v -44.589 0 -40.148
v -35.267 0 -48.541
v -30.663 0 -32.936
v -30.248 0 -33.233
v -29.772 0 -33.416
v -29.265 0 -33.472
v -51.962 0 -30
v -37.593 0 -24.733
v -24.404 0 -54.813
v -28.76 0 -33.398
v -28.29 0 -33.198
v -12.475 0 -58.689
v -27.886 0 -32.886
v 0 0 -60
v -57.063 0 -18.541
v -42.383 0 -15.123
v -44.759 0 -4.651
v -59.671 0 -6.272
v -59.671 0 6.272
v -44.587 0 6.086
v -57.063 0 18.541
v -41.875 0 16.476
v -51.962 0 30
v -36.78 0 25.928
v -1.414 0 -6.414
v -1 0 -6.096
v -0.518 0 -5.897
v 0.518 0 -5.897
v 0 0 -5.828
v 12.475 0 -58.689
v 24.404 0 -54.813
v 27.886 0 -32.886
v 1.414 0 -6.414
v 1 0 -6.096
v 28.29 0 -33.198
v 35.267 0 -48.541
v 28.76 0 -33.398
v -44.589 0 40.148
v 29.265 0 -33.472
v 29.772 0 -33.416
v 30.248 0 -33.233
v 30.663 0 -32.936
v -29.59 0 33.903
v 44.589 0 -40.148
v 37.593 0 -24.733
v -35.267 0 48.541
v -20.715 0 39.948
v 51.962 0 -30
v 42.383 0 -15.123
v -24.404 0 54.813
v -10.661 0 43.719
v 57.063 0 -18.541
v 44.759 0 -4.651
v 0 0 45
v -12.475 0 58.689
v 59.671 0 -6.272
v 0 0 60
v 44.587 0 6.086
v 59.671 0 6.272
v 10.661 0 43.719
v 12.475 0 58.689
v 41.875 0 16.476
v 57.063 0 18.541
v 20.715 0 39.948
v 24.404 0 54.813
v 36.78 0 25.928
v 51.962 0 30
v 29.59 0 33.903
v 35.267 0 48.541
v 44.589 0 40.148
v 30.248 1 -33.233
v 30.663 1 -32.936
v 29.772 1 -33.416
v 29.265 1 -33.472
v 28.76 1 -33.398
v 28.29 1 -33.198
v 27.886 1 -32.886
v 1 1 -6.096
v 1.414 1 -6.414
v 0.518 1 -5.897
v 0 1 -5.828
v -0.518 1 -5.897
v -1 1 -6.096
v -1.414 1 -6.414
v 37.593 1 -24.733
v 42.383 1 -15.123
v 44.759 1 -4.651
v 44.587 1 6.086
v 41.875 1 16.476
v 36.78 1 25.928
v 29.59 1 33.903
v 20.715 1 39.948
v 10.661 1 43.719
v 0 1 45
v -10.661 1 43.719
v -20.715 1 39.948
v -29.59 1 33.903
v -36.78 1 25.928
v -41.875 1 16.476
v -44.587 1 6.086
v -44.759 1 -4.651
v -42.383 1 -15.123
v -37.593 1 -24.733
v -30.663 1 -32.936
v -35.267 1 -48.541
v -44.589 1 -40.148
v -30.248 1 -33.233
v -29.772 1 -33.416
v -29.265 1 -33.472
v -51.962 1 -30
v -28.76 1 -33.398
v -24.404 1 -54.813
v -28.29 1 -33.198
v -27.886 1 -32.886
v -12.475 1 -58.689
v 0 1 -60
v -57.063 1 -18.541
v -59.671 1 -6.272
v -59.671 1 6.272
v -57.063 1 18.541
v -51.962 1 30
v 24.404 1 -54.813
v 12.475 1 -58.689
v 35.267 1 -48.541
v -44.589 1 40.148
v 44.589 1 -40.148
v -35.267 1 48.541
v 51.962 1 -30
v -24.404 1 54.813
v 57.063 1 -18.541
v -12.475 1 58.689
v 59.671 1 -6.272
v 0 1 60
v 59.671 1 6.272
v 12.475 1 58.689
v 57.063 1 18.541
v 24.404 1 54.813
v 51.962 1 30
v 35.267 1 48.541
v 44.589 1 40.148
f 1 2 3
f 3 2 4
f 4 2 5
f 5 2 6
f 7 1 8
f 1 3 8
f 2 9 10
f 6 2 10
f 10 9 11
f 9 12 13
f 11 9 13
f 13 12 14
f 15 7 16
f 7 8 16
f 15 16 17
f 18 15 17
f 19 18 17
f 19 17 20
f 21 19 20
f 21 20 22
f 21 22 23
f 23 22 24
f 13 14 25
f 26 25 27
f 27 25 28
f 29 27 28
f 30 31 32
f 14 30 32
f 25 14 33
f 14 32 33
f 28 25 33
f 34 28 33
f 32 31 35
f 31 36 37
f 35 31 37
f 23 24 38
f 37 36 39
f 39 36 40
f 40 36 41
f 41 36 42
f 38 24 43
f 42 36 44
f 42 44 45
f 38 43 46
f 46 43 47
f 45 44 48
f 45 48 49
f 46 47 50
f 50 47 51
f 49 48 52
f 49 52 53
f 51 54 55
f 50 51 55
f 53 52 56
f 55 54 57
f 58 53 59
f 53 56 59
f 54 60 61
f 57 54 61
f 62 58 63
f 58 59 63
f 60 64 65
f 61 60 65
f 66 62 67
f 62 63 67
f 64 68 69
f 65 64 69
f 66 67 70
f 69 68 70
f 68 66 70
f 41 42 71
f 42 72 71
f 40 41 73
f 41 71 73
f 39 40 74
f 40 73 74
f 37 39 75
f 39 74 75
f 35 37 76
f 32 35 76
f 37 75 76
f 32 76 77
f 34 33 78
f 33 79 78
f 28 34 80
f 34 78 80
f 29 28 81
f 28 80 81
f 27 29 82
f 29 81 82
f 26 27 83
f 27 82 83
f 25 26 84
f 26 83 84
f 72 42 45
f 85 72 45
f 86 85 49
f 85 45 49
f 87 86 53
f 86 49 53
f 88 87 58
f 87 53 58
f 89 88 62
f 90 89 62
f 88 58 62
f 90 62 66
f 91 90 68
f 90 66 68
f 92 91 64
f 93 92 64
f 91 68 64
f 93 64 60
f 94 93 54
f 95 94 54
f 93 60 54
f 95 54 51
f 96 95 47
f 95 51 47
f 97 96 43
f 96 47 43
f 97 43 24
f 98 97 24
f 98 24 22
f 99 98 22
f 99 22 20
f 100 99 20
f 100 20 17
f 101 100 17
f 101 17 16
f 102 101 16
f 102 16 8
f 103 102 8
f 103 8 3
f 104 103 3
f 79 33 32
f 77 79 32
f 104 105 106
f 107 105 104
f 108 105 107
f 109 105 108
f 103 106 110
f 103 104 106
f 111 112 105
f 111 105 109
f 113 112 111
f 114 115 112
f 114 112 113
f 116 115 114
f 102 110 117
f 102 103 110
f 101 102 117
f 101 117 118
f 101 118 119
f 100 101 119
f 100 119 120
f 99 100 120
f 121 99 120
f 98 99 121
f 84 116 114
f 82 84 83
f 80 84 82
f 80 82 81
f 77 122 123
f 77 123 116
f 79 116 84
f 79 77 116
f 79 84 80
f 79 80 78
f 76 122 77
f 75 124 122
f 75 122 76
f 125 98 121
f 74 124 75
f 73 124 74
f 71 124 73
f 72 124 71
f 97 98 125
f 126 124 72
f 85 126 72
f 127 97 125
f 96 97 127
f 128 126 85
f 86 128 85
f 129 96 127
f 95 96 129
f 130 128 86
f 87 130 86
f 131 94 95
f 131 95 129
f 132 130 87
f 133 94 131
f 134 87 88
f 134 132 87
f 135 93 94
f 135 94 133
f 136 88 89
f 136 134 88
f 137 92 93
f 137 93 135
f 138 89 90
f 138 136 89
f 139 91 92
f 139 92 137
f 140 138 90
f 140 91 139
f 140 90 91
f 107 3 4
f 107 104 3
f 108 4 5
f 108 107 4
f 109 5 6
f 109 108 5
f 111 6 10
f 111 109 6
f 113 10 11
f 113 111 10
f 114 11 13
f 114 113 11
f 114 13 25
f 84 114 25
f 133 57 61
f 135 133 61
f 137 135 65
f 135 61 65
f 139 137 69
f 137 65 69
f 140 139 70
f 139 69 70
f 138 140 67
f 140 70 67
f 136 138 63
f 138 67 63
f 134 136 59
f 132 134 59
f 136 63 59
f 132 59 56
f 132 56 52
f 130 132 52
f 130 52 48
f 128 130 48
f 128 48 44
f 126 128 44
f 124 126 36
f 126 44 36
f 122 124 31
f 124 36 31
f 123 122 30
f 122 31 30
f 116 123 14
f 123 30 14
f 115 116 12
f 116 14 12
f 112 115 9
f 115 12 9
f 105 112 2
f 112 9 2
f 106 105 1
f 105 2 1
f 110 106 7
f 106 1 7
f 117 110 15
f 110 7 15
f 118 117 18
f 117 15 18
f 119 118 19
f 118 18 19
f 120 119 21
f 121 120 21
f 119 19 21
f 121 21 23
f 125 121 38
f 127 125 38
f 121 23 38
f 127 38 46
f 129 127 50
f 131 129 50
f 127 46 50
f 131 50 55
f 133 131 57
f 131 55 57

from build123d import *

# Parameters (mm, degrees)
SKETCH1_R           = 60
BOSS_EXTRUDE1_DEPTH = 1
FILLET1_R           = 2


with BuildPart() as part:
    # Sketch1 → Boss-Extrude1 (new body)
    with BuildSketch(Plane(origin=(0, 0, 0), x_dir=(1, 0, 0), z_dir=(0, 1, 0))):
        with Locations(Location((0, 0, 0), (0, 0, 270))):
            Circle(SKETCH1_R)
        with BuildLine():
            Line((-29.221443851, 34.221443851), (0, 5))
            Line((0, 5), (29.221443851, 34.221443851))
            ThreePointArc((29.221443851, 34.221443851), (0, -45), (-29.221443851, 34.221443851))
        make_face(mode=Mode.SUBTRACT)
    extrude(amount=BOSS_EXTRUDE1_DEPTH)

    # Fillet1
    fillet1_edges = [part.edges().sort_by_distance(p)[0] for p in [
        (-29.221443851, 0.5, -34.221443851),
        (29.221443851, 0.5, -34.221443851),
        (0, 0.5, -5),
    ]]
    fillet(fillet1_edges, radius=FILLET1_R)


solid = part.part
